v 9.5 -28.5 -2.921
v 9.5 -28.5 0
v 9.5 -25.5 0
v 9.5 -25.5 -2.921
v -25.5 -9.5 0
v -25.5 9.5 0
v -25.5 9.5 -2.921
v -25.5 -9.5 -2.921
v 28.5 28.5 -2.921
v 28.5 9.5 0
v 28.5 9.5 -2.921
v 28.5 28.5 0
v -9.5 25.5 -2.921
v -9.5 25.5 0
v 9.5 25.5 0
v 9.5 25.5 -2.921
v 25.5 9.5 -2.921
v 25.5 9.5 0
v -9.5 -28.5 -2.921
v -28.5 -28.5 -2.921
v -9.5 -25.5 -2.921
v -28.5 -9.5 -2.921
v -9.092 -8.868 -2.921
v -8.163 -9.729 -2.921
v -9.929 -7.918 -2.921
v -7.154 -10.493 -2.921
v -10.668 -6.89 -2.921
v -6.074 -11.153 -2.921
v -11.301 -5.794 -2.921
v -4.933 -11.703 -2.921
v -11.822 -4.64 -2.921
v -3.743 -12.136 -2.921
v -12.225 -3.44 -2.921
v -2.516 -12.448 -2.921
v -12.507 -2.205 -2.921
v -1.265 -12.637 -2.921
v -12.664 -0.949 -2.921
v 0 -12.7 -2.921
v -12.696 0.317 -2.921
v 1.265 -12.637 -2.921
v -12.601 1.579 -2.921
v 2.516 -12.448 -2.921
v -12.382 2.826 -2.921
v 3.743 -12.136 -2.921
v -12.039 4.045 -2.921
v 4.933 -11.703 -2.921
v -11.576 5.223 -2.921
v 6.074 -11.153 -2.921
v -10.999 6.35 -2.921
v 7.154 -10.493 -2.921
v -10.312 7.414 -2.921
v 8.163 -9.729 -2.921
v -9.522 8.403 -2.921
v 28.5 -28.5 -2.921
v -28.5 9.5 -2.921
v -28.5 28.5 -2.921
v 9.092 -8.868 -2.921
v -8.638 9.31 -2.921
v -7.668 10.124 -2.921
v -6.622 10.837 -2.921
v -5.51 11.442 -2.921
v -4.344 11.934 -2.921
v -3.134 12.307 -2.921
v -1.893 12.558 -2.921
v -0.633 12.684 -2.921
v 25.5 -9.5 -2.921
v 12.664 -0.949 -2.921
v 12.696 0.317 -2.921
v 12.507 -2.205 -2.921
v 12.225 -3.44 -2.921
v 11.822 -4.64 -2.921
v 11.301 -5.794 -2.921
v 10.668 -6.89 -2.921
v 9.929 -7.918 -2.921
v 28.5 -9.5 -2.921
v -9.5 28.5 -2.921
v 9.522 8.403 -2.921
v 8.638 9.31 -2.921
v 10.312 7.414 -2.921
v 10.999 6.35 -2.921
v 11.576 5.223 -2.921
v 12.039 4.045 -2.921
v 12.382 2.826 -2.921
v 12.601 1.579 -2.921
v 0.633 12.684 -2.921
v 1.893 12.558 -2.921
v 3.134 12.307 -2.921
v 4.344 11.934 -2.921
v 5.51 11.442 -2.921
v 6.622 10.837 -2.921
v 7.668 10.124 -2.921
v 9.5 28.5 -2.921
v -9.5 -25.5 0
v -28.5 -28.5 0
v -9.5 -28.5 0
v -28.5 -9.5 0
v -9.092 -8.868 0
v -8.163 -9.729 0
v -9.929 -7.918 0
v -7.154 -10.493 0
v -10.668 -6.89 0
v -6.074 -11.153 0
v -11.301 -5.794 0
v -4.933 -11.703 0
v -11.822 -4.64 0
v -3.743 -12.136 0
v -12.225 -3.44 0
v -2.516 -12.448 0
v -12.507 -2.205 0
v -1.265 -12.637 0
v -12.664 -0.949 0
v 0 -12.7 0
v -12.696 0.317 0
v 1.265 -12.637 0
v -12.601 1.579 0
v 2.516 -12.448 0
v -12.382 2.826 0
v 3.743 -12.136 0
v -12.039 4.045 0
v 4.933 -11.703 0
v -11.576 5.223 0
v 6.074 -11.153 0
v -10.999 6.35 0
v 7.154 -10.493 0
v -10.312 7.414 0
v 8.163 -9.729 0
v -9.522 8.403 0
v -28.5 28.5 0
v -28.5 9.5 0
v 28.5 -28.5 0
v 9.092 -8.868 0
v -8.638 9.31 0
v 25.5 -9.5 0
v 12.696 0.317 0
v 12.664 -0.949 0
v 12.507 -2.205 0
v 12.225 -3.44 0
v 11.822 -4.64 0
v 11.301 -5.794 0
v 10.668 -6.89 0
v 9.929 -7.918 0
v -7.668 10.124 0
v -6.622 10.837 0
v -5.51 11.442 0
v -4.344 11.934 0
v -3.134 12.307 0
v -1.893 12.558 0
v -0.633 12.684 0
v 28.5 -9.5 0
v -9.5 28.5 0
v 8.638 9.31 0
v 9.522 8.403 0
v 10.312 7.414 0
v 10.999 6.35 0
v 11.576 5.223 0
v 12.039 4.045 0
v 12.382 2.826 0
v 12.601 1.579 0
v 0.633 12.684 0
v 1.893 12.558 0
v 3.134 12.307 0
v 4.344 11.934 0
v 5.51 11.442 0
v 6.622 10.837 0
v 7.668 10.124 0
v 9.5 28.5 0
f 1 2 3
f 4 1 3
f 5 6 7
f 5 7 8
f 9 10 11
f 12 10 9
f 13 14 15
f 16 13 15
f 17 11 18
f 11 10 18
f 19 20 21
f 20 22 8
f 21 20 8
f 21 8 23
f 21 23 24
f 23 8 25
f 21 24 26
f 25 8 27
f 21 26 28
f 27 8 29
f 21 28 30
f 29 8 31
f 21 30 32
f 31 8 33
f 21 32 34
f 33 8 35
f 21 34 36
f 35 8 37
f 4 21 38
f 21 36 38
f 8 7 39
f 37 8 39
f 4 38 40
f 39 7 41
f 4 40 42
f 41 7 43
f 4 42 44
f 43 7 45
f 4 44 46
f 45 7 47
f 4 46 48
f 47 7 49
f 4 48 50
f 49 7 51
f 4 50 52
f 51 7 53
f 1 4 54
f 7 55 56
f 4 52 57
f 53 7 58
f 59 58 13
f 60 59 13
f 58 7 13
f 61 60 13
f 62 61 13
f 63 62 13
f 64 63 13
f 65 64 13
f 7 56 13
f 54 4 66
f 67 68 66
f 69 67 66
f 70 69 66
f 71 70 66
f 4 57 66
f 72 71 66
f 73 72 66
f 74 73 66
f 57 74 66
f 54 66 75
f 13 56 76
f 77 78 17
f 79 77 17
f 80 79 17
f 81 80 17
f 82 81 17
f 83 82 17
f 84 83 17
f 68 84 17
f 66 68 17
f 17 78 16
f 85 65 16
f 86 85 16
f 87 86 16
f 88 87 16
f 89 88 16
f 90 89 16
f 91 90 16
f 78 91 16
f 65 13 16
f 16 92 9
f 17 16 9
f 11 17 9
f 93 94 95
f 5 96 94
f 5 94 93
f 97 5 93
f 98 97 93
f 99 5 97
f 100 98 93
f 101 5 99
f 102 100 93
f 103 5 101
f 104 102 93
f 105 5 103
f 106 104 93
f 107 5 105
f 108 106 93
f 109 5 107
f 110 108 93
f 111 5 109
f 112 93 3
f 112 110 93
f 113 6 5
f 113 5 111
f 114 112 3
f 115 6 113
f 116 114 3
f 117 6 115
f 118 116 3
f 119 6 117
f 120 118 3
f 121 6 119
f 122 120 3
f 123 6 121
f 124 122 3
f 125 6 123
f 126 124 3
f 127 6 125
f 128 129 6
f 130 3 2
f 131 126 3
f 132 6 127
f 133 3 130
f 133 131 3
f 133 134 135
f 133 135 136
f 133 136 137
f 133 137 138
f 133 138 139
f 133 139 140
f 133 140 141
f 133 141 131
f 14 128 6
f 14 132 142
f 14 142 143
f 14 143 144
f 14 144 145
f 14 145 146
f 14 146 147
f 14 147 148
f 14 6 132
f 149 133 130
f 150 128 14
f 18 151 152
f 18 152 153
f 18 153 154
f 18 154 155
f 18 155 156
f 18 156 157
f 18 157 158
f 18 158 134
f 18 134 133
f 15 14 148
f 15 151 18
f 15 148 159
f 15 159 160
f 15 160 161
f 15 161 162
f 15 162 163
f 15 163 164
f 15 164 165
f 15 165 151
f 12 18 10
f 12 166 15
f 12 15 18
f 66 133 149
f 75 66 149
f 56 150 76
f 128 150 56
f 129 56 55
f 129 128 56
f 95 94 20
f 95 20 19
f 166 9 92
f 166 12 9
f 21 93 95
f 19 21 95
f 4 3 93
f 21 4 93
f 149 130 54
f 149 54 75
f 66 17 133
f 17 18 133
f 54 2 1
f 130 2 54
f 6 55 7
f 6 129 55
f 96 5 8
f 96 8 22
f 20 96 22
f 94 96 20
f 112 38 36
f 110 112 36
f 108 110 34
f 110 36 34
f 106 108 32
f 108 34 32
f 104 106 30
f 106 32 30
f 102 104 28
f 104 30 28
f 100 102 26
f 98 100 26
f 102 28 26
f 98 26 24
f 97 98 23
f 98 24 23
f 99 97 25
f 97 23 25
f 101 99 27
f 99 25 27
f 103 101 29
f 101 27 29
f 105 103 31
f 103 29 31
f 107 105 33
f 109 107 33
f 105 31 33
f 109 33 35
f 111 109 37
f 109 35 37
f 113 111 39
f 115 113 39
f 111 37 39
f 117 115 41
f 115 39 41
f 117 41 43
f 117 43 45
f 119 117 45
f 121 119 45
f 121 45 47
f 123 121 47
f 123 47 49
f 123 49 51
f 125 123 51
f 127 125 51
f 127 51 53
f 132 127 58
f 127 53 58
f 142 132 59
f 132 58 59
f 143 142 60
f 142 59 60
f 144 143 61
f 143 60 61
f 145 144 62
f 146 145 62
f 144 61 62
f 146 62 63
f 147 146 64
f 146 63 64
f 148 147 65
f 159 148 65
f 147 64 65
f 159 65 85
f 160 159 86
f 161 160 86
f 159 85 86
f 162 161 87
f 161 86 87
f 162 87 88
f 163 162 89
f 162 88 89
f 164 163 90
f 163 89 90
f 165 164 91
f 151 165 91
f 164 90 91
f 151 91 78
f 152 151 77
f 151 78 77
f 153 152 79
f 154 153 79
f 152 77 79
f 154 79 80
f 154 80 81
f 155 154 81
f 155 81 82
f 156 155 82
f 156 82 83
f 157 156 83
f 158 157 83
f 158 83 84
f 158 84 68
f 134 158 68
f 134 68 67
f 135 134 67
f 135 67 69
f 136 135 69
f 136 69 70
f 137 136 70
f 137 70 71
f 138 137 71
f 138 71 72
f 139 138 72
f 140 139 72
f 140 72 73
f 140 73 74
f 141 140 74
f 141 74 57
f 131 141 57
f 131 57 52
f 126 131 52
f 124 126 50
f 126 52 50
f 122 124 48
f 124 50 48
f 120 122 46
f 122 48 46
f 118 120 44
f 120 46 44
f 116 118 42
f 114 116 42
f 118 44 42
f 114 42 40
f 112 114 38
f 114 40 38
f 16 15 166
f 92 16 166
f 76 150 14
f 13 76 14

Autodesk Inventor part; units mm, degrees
ref_plane "YZ Plane" through (0, 0, 0) normal (1, 0, 0) x (0, 1, 0)
ref_plane "XZ Plane" through (0, 0, 0) normal (0, 1, 0) x (-1, 0, 0)
ref_plane "XY Plane" through (0, 0, 0) normal (0, 0, 1) x (1, 0, 0)
sketch "Sketch1" plane through (0, 0, 0) normal (0, 0, 1) x (1, 0, 0)
  line L0 (-28.5, -28.5) -> (28.5, -28.5)
  line L1 (28.5, -28.5) -> (28.5, 28.5)
  line L2 (28.5, 28.5) -> (-28.5, 28.5)
  line L3 (-28.5, 28.5) -> (-28.5, -28.5)
  line L4 (-28.5, -28.5) -> (28.5, 28.5) construction
  line L5 (28.5, -28.5) -> (-28.5, 28.5) construction
  point P0 (0, 0)
  dimension "d0" = 57
  dimension "d1" = 57
extrude "Extrusion1" add sketch "Sketch1" against normal blind 2.921
sketch "Sketch2" plane through (0, 0, 0) normal (0, 0, 1) x (1, 0, 0)
  line L0 (-10.0551, 28.5) -> (-9.5, 28.5)
  line L1 (-9.5, 28.5) -> (-9.5, 25.5)
  line L2 (-9.5, 25.5) -> (9.5, 25.5)
  line L3 (9.5, 25.5) -> (9.5, 28.5)
  line L4 (-9.5, 28.5) -> (9.5, 28.5)
  line L5 (-9.5, -28.5) -> (9.5, -28.5)
  line L6 (9.5, -28.5) -> (9.5, -25.5)
  line L7 (9.5, -25.5) -> (-9.5, -25.5)
  line L8 (-9.5, -25.5) -> (-9.5, -28.5)
  line L9 (-28.5, 9.5) -> (-25.5, 9.5)
  line L10 (-25.5, 9.5) -> (-25.5, -9.5)
  line L11 (-25.5, -9.5) -> (-28.5, -9.5)
  line L12 (-28.5, -9.5) -> (-28.5, 9.5)
  line L13 (28.5, 9.5) -> (25.5, 9.5)
  line L14 (25.5, 9.5) -> (25.5, -9.5)
  line L15 (25.5, -9.5) -> (28.5, -9.5)
  line L16 (28.5, -9.5) -> (28.5, 9.5)
  line L17 (28.5, -28.5) -> (28.5, 28.5) projected
  line L18 (-28.5, 28.5) -> (-28.5, -28.5) projected
  line L19 (-28.5, -28.5) -> (28.5, -28.5) projected
  line L20 (28.5, 28.5) -> (-28.5, 28.5) projected
  line L21 (-28.5, 28.5) -> (-28.5, -28.5) projected
  dimension "d4" = 3
  dimension "d5" = 19
  dimension "d17" = 19
  dimension "d18" = 3
  dimension "d19" = 3
  dimension "d20" = 19
  dimension "d34" = 3
  dimension "d35" = 19
  dimension "d47" = 19
  dimension "d48" = 19
  dimension "d49" = 19
  dimension "d50" = 19
  dimension "d51" = 19
  dimension "d52" = 19
  dimension "d54" = 19
  dimension "d55" = 19
extrude "Extrusion3" cut sketch "Sketch2" against normal blind 25.4 contours L4 L3 L2 L1 | L9 L10 L11 L12 | L16 L15 L14 L13 | L8 L7 L6 L5
hole "Hole1" at (0, 0, 0) direction (0, 0, -1) diameter 25.4 end through all
equation "\"d1\" = d0"
equation "\"d17\" = d5"
equation "\"d18\" = d4"
equation "\"d19\" = d4"
equation "\"d20\" = d5"
equation "\"d34\" = d4"
equation "\"d35\" = d5"
equation "\"d47\" = -0.5 * d5 + 0.5 * d0"
equation "\"d49\" = d47"
equation "\"d50\" = d47"
equation "\"d51\" = d47"
equation "\"d23\" = 0.5 * d0"
equation "\"d53\" = 0.5 * d0"
properties part number "Side A"
